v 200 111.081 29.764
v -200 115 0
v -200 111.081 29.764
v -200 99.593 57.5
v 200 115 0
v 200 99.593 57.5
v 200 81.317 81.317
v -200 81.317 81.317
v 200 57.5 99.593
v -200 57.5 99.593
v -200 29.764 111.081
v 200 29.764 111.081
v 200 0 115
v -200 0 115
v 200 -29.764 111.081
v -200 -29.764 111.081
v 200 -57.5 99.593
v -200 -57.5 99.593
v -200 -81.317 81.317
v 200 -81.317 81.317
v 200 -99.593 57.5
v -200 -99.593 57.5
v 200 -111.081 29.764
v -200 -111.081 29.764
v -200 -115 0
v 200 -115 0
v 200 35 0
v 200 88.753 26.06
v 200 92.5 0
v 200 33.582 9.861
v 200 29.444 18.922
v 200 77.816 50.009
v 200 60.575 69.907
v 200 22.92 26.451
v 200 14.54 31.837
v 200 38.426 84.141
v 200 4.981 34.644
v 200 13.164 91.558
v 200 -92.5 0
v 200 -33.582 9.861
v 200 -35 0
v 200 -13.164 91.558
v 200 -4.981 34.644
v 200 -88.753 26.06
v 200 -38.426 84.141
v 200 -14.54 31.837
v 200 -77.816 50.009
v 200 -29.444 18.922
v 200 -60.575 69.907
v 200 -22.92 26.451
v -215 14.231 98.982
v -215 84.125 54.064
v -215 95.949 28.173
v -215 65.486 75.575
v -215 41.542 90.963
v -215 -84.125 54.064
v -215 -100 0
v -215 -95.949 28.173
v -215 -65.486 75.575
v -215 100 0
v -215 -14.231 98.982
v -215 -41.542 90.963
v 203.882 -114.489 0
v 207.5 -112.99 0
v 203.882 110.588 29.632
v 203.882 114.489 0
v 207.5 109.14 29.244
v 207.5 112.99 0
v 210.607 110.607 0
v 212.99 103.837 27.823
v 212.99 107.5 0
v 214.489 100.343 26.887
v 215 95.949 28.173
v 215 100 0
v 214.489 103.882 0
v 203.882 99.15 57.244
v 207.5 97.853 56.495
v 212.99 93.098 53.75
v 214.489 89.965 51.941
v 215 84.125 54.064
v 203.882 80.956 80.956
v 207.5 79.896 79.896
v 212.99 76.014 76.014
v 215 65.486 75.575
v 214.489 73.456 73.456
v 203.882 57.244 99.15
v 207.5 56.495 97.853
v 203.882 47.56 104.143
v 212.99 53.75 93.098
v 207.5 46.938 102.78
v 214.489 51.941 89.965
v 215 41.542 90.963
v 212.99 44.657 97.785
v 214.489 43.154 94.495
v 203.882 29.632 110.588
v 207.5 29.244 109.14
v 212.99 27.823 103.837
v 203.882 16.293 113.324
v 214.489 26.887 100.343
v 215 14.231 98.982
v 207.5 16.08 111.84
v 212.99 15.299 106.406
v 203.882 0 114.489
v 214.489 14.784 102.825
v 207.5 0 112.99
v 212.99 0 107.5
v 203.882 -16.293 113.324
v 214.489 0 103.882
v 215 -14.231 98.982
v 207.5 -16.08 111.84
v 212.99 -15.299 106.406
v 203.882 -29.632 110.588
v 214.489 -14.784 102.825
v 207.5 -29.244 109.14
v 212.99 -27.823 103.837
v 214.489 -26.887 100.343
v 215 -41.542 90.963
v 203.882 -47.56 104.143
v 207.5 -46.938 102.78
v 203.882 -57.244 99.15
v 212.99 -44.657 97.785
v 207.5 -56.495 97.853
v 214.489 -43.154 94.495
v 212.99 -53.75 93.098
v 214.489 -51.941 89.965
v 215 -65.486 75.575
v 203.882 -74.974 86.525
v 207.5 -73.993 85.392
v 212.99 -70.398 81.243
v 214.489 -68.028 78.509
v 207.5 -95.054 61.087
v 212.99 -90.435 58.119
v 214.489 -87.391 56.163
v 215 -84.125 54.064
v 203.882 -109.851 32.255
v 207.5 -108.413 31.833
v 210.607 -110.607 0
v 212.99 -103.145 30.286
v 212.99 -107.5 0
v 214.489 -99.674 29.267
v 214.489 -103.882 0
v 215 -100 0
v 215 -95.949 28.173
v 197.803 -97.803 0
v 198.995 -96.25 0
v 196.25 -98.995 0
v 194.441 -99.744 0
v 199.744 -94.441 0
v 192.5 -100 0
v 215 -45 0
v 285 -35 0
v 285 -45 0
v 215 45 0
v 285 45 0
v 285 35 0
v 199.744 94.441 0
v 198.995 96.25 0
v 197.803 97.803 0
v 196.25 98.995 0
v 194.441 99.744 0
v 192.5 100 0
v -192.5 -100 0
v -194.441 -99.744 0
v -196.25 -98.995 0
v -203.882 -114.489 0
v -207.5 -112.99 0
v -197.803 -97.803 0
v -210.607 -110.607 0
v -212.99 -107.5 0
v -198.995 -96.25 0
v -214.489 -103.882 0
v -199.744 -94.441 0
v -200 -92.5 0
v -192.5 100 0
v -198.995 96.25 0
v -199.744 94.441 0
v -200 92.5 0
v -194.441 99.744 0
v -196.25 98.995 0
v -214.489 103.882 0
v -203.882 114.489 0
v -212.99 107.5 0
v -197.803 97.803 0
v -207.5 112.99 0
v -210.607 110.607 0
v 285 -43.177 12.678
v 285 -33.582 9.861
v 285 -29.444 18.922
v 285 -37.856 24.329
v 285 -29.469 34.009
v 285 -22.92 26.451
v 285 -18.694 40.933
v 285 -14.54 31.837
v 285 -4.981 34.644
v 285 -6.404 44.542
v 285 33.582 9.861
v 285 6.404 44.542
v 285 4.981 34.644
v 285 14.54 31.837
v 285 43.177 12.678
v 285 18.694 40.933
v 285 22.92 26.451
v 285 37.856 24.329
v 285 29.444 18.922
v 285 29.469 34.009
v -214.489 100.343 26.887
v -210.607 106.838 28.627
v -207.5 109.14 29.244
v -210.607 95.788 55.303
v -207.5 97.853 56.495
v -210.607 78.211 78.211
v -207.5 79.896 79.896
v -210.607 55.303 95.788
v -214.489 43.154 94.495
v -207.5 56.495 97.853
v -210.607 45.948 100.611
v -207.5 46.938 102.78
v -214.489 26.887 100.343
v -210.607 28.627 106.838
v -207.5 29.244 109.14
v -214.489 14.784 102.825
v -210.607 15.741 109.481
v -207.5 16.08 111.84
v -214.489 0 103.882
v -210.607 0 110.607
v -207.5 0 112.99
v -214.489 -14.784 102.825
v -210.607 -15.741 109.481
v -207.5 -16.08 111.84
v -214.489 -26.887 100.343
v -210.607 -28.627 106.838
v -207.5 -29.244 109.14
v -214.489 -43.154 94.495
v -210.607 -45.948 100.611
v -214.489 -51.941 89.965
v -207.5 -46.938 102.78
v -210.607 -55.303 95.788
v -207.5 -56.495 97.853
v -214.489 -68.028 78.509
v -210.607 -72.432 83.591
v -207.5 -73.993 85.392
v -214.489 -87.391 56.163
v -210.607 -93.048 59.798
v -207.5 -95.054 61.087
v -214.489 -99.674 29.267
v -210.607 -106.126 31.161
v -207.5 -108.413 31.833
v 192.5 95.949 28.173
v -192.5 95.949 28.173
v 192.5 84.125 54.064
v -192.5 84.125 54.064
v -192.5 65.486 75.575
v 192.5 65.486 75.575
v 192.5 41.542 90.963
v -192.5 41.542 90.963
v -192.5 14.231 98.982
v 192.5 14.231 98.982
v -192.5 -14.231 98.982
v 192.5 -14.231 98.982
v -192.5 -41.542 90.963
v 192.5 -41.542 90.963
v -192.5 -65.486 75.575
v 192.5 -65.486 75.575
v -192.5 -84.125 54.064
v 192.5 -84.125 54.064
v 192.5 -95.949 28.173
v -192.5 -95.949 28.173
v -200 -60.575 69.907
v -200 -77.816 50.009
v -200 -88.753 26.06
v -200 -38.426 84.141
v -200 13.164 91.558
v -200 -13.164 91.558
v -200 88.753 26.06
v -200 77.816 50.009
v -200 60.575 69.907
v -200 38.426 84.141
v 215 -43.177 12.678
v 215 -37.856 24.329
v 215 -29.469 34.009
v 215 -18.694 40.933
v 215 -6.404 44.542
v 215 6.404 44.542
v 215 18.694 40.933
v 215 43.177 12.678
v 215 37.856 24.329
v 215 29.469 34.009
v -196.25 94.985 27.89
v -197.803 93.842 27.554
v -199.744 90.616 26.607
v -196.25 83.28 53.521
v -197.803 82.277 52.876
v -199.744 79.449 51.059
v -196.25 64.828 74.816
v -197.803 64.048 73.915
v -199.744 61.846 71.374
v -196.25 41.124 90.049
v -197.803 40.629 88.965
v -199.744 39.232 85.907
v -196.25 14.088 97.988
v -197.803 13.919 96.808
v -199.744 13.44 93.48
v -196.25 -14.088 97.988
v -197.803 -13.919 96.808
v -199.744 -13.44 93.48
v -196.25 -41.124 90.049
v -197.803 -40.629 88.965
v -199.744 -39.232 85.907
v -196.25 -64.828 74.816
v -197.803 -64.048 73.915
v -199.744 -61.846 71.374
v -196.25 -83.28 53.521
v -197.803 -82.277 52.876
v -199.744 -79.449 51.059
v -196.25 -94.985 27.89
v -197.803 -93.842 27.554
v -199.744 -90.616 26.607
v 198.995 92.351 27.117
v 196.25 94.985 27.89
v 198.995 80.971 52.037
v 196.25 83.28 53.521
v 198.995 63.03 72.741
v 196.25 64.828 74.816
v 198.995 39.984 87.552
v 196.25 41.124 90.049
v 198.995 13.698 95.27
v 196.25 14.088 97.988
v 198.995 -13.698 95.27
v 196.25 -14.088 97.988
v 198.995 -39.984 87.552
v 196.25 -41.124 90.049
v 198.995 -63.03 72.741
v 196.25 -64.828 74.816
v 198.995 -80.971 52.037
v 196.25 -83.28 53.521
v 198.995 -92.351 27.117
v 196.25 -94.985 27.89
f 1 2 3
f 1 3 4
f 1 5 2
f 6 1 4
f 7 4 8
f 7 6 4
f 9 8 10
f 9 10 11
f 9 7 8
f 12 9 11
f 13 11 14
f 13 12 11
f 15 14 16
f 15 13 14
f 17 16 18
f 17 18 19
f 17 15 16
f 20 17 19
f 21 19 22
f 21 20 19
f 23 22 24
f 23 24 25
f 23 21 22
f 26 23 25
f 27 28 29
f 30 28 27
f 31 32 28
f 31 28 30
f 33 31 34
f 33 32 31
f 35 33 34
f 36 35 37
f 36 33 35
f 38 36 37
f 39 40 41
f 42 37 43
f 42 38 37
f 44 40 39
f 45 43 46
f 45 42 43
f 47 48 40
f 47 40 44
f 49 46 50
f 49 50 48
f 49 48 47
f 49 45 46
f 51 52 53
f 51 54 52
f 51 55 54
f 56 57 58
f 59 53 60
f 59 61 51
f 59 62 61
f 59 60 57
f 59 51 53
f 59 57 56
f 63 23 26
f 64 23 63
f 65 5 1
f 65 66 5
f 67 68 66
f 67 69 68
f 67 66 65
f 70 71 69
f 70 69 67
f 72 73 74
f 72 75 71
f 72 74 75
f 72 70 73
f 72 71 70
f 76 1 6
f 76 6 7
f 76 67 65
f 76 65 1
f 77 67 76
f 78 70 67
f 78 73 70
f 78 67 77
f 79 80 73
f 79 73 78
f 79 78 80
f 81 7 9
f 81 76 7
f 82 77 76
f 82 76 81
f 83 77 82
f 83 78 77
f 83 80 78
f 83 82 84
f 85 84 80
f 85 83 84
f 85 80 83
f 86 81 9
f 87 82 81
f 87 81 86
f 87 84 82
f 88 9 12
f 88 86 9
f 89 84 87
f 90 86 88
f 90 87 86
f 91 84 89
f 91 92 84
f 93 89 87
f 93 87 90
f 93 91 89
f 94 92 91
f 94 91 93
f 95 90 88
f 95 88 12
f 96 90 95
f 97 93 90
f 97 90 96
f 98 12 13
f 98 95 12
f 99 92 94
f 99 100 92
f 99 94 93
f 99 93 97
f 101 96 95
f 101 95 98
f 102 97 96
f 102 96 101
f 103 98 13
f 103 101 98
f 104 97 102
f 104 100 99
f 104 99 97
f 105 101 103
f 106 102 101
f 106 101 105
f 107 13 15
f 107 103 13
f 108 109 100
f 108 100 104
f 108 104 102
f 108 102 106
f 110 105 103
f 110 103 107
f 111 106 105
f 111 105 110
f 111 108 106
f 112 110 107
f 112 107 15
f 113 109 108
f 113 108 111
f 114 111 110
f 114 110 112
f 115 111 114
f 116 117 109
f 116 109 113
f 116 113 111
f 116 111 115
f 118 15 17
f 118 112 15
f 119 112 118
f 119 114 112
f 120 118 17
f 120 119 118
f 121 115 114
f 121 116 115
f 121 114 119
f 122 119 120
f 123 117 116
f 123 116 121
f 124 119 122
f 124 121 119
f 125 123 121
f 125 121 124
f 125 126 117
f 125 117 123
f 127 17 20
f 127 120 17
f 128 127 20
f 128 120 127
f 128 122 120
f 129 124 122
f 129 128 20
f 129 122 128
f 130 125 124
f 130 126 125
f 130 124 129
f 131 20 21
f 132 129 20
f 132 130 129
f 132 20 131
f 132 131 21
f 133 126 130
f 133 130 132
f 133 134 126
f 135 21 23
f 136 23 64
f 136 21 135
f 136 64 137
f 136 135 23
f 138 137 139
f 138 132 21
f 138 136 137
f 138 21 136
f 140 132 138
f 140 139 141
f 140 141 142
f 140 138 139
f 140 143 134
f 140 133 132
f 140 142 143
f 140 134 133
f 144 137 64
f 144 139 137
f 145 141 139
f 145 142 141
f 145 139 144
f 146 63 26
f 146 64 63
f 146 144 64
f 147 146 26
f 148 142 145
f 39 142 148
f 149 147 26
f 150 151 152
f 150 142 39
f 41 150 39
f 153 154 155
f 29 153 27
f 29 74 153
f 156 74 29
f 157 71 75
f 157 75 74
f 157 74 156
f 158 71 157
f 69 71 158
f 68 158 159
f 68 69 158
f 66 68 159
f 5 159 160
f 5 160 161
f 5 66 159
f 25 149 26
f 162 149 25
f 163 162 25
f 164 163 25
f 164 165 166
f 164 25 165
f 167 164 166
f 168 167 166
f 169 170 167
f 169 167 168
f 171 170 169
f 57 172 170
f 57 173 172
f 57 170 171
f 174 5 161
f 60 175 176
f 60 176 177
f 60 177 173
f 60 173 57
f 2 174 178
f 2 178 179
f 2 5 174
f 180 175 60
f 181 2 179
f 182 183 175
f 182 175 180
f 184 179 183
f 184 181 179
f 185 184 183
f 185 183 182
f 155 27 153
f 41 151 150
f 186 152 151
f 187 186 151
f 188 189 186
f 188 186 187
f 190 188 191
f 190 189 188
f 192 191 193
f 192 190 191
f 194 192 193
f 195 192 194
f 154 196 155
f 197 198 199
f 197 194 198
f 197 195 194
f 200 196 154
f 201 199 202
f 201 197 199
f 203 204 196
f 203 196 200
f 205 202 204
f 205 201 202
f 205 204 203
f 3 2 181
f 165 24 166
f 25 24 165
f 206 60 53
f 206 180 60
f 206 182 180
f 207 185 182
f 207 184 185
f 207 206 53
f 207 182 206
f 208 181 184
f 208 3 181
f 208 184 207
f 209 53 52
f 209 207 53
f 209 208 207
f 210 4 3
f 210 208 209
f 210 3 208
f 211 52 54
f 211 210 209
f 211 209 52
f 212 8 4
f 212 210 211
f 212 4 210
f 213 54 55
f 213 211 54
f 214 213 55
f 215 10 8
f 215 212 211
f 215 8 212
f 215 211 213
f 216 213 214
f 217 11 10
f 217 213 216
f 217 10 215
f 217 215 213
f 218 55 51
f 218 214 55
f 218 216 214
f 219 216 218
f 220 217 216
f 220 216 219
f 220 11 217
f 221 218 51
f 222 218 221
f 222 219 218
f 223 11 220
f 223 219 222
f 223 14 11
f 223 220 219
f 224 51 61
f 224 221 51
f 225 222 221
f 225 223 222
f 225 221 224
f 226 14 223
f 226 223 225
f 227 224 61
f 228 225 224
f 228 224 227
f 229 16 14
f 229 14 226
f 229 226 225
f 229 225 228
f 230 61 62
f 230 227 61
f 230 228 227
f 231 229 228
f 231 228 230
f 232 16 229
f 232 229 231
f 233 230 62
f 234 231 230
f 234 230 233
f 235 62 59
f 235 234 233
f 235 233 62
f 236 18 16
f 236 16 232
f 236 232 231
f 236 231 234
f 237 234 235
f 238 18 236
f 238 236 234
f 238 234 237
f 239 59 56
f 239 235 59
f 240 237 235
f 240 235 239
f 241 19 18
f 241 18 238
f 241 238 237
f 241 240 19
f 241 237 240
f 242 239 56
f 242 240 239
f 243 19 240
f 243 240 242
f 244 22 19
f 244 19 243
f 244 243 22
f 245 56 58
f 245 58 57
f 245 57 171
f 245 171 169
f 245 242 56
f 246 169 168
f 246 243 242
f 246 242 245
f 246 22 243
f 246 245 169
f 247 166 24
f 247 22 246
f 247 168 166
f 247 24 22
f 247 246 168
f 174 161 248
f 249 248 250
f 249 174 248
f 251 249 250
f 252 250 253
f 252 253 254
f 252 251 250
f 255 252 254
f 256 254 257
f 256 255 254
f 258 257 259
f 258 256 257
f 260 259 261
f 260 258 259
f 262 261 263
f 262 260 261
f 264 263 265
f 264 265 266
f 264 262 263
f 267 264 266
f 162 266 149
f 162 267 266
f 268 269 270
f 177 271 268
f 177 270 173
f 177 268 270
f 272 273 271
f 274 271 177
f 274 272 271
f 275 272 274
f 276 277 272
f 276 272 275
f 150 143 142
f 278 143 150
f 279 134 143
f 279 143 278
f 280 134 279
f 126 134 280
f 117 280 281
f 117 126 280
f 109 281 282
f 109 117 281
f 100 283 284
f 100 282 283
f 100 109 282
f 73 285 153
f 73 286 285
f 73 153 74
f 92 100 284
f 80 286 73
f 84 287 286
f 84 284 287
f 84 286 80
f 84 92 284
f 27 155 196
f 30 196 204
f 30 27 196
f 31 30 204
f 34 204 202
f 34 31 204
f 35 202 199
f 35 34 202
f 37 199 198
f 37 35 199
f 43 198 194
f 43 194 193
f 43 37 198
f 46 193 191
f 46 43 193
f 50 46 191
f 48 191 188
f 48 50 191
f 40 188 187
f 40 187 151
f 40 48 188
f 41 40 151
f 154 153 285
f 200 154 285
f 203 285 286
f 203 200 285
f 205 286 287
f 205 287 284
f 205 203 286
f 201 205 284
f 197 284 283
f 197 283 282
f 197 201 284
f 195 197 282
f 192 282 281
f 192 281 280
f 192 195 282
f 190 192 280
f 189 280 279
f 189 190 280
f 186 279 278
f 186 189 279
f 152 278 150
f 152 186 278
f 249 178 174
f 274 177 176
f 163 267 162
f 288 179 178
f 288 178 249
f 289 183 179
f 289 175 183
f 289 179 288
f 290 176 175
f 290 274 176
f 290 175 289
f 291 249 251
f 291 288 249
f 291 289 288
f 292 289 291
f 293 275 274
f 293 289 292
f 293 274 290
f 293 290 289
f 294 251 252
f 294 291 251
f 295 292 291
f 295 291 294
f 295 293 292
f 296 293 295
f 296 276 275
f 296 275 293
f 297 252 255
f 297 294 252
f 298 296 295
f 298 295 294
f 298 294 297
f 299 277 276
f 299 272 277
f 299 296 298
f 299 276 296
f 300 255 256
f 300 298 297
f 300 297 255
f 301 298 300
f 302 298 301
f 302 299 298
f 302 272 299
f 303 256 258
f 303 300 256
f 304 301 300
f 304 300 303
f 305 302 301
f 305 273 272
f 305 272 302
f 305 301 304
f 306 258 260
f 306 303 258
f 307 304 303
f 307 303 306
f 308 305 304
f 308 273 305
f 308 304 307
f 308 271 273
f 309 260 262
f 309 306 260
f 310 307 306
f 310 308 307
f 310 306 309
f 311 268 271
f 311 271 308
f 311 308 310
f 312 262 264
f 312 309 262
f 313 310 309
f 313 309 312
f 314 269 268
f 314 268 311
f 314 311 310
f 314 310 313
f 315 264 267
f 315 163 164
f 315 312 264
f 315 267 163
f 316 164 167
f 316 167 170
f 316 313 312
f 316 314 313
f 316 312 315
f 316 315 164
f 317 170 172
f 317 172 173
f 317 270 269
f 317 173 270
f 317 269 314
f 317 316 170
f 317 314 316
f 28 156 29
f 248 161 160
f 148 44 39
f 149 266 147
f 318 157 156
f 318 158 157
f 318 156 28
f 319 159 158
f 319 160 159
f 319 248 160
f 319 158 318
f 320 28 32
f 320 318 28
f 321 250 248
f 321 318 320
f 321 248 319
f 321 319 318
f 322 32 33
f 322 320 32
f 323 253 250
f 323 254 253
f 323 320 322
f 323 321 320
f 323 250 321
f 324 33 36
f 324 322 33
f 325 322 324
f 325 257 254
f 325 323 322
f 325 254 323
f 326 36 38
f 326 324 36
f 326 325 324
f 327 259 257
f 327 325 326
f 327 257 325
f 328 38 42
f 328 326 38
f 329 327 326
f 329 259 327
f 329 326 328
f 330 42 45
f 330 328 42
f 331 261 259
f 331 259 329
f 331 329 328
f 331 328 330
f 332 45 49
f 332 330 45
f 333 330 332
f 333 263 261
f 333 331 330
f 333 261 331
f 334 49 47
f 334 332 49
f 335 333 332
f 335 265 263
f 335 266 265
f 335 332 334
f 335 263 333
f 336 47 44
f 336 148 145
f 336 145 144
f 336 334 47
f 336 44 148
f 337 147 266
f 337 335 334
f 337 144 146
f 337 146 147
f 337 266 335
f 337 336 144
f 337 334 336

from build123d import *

# Parameters (mm, degrees)
REVOLVE1_ANGLE = 180


with BuildPart() as part:
    # Sketch1 → Revolve1 (revolve)
    with BuildSketch(Plane.XY):
        with BuildLine():
            Line((-215, 0), (-215, 100))
            ThreePointArc((-215, 100), (-210.606601718, 110.606601718), (-200, 115))
            Line((-200, 115), (200, 115))
            ThreePointArc((200, 115), (210.606601718, 110.606601718), (215, 100))
            Line((215, 100), (215, 45))
            Line((215, 45), (285, 45))
            Line((285, 45), (285, 35))
            Line((285, 35), (200, 35))
            Line((200, 35), (200, 92.5))
            ThreePointArc((200, 92.5), (197.803300859, 97.803300859), (192.5, 100))
            Line((192.5, 100), (-192.5, 100))
            ThreePointArc((-192.5, 100), (-197.803300859, 97.803300859), (-200, 92.5))
            Line((-200, 92.5), (-200, 0))
            Line((-200, 0), (-215, 0))
        make_face()
    revolve(axis=Axis((0, 0, 0), (1, 0, 0)), revolution_arc=REVOLVE1_ANGLE)


solid = part.part
